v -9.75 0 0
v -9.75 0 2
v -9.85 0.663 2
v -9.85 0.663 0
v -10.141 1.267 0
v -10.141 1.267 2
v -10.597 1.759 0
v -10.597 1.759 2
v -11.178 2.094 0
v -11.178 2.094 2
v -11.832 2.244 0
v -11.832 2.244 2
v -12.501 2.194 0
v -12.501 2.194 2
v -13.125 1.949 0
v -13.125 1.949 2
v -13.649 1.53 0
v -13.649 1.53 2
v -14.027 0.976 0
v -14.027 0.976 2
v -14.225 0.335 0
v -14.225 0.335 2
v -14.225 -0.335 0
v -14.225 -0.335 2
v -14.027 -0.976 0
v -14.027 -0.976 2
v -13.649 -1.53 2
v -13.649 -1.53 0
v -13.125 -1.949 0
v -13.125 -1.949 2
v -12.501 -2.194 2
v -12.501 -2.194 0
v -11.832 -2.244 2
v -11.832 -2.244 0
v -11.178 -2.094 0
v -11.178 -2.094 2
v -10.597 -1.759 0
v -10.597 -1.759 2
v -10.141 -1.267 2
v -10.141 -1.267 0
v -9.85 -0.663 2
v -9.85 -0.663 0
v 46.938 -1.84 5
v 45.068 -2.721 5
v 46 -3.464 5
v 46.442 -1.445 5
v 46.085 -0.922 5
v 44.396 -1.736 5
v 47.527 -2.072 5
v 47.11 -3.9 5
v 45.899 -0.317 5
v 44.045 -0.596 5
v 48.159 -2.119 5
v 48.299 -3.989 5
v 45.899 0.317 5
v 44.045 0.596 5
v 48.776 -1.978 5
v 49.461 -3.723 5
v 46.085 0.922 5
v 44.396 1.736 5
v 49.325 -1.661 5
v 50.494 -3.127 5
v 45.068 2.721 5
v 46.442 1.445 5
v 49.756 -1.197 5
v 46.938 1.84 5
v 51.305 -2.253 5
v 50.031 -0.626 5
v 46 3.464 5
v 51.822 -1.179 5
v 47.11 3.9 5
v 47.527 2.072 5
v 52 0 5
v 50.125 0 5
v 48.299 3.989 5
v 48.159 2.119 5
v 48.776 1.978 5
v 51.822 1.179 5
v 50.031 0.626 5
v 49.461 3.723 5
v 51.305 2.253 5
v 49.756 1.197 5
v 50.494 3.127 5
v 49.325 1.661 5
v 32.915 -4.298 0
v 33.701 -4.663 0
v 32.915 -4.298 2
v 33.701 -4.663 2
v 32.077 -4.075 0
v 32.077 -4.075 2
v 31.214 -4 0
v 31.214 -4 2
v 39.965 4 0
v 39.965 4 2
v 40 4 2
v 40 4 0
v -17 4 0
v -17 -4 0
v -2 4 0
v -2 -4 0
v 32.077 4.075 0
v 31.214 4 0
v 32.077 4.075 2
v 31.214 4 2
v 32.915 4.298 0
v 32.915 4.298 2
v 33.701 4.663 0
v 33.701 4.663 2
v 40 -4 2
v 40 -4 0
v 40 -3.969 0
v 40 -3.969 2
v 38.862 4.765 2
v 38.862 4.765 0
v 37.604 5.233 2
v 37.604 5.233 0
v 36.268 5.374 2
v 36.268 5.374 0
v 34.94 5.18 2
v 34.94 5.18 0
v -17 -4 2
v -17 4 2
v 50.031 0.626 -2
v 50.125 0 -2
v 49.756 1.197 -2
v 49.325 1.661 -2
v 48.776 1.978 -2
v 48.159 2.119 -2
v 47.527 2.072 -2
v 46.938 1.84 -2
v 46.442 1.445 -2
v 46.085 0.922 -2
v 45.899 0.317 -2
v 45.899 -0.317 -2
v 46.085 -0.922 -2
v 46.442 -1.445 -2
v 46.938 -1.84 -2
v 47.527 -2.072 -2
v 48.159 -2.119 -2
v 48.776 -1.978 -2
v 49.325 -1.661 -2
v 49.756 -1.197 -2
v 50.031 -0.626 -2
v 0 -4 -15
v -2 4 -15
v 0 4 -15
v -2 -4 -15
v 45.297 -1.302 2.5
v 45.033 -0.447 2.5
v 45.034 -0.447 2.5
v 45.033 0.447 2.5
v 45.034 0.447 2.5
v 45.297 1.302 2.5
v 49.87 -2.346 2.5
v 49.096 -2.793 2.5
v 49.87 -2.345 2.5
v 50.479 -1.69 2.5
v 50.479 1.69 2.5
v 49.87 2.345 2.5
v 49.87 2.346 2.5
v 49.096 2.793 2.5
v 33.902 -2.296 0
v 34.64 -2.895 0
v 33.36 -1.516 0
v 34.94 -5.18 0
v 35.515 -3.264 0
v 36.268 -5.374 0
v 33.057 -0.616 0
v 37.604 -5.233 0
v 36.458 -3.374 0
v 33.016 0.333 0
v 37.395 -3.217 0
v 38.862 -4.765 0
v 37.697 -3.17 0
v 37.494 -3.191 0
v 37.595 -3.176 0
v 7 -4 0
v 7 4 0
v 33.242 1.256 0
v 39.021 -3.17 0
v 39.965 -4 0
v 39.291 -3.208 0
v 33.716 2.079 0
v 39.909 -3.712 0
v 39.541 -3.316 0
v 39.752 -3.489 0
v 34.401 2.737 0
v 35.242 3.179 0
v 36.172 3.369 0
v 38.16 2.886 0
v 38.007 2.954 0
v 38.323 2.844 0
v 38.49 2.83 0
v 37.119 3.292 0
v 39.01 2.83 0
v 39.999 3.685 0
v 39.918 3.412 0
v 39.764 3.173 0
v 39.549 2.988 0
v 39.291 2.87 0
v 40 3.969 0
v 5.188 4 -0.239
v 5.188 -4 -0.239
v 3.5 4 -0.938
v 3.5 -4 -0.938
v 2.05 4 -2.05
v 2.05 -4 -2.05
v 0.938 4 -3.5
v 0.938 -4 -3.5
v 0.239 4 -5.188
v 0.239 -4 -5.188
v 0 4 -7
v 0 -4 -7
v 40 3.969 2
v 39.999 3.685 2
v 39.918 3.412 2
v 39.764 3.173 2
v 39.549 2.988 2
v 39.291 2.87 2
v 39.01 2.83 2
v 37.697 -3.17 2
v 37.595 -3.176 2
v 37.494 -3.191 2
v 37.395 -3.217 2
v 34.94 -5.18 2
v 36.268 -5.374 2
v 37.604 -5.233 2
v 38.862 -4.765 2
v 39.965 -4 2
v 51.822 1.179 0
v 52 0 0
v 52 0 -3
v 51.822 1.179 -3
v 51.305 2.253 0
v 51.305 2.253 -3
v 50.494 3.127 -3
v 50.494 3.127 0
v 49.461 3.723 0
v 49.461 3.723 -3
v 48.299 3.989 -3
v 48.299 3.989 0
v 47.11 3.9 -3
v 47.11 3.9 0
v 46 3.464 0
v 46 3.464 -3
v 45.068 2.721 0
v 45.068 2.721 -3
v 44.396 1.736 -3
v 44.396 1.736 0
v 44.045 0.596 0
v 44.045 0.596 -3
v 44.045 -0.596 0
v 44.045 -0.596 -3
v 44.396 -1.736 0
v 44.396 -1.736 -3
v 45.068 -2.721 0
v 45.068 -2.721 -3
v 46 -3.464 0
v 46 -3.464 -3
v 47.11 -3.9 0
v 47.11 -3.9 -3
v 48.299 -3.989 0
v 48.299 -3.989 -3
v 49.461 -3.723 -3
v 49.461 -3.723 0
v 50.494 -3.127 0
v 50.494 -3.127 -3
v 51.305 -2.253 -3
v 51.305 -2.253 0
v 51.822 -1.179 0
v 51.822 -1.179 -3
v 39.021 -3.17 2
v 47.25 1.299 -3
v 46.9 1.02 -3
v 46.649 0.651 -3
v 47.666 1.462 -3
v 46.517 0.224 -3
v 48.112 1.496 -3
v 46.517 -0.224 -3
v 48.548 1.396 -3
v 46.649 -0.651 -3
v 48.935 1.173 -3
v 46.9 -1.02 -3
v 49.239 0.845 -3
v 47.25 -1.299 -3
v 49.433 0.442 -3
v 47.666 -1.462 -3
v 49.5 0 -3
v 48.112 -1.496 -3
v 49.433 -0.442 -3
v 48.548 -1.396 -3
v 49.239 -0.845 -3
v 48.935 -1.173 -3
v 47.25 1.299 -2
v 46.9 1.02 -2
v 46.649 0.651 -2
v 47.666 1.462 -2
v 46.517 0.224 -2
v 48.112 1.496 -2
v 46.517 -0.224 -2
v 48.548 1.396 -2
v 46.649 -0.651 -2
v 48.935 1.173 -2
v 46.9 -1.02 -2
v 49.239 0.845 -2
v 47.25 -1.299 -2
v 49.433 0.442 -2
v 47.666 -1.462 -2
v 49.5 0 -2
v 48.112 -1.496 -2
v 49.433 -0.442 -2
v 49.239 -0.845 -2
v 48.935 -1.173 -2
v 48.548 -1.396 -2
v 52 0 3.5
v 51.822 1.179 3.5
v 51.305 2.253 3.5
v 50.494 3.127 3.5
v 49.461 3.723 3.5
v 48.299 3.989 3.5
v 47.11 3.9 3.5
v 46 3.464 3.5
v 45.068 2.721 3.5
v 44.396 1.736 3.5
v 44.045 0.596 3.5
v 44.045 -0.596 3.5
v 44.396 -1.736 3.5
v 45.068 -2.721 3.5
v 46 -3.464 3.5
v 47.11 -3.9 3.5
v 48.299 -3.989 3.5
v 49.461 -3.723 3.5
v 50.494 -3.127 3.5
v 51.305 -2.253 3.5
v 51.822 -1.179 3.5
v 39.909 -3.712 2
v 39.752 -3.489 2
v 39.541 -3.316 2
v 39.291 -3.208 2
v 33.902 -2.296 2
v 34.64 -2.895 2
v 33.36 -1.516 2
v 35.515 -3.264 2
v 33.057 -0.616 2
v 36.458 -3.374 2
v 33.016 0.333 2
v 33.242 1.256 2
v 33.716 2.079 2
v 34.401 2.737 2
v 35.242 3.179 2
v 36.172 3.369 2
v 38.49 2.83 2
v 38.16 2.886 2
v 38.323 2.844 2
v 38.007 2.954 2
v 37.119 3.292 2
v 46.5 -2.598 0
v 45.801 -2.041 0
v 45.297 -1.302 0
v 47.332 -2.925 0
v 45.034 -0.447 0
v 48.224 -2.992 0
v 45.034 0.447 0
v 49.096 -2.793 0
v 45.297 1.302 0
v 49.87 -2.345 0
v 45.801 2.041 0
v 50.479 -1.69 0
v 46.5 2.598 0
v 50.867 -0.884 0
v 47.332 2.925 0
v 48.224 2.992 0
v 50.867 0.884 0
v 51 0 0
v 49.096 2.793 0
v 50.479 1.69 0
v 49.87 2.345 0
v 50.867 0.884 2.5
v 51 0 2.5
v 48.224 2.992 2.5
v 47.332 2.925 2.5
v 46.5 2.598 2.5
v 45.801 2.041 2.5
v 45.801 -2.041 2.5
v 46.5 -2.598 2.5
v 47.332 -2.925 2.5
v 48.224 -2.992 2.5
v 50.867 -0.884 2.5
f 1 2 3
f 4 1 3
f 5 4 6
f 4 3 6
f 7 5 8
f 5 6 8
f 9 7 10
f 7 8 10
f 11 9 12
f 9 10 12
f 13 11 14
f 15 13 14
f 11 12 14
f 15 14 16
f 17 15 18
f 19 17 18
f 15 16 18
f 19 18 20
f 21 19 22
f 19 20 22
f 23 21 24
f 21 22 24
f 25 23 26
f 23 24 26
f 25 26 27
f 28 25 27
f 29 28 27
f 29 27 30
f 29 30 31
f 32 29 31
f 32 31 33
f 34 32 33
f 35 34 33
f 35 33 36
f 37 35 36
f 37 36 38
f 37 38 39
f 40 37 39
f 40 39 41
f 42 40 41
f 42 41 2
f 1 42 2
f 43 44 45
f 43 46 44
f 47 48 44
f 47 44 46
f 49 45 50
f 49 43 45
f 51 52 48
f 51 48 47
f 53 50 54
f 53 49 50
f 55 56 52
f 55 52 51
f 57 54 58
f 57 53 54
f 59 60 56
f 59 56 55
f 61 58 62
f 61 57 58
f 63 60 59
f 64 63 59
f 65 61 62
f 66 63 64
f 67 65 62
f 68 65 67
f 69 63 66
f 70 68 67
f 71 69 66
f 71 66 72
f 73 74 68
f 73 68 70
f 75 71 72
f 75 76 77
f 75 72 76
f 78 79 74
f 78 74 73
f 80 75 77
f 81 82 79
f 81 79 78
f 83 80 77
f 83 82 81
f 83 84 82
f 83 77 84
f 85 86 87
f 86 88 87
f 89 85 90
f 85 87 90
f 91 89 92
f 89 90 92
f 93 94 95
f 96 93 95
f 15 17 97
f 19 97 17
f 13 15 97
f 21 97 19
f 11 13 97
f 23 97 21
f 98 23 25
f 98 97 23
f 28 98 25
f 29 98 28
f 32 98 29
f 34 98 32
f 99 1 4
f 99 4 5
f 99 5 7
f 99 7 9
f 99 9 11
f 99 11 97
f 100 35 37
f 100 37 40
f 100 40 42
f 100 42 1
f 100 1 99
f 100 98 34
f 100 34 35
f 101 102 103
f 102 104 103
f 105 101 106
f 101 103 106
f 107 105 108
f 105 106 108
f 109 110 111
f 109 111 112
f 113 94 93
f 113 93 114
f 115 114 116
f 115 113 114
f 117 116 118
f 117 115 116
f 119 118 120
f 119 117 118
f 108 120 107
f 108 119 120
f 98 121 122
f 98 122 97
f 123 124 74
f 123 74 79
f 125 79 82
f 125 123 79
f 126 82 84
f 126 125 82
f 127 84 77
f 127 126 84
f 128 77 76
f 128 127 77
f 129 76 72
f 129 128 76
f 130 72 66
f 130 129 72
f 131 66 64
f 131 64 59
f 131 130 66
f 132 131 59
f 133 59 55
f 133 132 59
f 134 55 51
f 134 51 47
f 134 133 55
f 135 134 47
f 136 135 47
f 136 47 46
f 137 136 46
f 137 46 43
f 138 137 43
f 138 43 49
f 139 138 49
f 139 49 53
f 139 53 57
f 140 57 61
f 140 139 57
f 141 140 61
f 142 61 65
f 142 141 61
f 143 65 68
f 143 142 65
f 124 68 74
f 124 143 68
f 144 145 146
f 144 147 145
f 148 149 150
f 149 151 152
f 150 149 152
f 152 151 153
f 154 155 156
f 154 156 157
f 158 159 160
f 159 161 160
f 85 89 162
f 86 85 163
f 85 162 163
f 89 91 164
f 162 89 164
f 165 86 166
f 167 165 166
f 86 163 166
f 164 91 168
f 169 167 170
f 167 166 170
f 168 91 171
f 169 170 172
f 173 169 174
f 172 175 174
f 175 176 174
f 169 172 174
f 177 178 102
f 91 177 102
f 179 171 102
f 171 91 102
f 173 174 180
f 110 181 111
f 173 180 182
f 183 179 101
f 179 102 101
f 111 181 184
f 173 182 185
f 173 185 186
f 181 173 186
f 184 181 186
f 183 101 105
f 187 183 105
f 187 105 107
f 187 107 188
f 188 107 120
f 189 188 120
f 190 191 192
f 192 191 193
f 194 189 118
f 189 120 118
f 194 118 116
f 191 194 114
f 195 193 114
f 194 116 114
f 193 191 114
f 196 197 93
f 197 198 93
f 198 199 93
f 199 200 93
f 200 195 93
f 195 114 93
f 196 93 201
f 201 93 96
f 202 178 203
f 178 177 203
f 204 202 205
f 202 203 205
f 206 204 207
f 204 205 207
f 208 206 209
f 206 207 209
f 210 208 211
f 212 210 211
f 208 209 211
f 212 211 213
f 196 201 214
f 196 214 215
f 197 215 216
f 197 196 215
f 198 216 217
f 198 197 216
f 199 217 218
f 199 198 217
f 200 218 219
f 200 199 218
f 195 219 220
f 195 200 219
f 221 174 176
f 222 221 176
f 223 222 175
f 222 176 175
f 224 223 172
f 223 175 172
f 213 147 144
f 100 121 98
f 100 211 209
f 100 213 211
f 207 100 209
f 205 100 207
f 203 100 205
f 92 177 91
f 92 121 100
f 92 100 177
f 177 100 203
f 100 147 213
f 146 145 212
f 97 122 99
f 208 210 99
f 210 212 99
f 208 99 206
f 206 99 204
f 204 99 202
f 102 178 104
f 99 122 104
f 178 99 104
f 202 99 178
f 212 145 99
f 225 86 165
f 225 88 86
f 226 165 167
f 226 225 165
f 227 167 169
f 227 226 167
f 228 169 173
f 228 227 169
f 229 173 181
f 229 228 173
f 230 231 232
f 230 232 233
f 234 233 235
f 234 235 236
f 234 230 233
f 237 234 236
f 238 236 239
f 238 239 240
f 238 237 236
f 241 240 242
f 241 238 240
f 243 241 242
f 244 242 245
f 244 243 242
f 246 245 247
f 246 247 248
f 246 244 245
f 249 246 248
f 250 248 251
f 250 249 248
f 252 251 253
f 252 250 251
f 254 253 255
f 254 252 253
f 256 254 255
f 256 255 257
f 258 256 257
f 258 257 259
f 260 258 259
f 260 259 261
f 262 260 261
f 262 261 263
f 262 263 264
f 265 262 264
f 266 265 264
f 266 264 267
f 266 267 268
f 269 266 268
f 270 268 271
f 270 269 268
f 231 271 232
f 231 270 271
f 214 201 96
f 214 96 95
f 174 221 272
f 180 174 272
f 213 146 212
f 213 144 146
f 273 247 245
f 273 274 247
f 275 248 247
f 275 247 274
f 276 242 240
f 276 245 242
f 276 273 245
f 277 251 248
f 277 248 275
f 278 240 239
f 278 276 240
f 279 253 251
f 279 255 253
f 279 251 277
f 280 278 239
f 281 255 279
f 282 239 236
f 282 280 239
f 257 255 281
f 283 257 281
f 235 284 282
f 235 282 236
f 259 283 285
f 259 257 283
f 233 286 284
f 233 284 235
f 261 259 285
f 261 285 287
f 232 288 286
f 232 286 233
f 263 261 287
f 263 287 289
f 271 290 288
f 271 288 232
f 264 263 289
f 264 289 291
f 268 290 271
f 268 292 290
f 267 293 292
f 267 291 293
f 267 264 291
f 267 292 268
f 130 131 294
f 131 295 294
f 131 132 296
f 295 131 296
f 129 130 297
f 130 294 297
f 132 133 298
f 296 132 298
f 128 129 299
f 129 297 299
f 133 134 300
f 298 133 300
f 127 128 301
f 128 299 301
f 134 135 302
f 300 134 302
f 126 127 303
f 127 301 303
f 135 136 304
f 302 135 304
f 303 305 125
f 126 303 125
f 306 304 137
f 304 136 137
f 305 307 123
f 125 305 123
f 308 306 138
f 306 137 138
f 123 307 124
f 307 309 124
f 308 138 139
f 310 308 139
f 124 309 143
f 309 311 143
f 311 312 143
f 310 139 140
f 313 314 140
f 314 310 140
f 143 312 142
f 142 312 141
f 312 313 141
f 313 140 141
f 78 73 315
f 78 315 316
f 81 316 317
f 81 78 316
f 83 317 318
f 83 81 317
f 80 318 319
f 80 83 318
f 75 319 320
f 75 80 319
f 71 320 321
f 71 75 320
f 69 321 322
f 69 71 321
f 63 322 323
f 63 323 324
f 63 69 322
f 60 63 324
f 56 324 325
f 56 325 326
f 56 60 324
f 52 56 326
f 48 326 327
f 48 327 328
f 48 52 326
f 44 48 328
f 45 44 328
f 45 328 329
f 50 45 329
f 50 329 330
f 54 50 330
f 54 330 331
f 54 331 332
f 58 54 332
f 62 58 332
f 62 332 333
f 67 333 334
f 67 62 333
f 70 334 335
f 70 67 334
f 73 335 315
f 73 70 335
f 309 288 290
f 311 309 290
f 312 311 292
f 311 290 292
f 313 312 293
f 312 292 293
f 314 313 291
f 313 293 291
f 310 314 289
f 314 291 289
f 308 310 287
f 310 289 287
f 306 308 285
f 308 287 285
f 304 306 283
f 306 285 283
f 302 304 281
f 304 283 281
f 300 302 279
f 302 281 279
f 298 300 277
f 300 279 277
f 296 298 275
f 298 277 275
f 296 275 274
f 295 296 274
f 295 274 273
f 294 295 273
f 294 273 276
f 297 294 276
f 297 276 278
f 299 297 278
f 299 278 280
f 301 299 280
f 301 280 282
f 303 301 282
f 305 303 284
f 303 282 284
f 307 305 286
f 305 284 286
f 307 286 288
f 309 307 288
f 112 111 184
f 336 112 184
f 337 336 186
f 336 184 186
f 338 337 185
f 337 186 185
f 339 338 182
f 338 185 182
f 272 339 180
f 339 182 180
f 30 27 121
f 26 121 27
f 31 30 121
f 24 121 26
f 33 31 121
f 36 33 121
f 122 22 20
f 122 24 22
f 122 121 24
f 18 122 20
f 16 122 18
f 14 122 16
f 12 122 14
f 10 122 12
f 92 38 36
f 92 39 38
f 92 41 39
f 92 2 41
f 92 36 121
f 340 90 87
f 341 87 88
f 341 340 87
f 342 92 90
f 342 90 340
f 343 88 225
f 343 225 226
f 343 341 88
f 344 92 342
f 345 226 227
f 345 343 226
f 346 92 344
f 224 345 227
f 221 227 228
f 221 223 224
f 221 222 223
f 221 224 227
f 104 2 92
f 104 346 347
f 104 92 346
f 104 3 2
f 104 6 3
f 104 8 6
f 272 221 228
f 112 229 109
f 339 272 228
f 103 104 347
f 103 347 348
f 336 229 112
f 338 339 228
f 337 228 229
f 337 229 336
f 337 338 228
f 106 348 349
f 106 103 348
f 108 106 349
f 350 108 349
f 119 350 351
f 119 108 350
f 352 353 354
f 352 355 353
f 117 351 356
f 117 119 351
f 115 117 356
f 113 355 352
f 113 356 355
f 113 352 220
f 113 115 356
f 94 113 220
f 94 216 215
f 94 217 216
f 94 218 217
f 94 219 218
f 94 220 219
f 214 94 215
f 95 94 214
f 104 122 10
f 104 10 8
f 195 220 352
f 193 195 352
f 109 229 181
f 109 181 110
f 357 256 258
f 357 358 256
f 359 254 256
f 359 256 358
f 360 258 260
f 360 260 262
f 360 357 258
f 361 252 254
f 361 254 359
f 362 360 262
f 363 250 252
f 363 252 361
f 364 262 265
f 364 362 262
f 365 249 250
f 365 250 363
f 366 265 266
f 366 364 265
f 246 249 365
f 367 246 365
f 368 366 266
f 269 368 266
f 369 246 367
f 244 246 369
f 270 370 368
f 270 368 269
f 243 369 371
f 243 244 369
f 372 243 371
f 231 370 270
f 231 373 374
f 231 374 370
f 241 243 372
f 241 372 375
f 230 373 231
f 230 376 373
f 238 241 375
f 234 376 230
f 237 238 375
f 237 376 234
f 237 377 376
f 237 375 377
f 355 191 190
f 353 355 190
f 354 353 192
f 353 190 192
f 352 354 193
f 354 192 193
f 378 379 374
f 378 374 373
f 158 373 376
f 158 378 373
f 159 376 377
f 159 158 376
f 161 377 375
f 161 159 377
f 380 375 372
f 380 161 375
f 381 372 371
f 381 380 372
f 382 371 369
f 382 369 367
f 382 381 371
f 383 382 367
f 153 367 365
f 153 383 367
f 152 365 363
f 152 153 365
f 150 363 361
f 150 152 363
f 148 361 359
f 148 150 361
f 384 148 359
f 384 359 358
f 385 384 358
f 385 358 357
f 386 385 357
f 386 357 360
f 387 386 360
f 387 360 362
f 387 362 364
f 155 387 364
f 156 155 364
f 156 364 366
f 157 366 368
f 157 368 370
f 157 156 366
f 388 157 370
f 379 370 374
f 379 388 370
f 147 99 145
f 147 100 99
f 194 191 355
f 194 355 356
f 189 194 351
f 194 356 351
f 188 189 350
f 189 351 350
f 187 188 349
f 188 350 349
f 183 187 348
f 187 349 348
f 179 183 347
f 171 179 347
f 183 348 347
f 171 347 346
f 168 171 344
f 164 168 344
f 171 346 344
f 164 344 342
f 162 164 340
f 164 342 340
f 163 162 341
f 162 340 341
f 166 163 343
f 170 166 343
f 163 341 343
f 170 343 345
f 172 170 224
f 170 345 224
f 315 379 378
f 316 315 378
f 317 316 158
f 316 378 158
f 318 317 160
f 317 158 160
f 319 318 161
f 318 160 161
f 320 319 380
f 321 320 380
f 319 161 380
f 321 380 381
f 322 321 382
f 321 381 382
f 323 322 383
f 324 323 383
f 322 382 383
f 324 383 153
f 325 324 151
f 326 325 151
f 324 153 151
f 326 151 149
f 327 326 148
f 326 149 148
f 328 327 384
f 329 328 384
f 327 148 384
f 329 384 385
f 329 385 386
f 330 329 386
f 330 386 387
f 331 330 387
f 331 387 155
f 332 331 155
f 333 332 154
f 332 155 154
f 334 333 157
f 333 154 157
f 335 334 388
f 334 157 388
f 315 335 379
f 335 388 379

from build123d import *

# Parameters (mm, degrees)
F1_DEPTH       = 4
F2_R           = 5.375
F3_DEPTH       = 2
F5_DEPTH       = 17.001
F6_R           = 7
F7_T1_DEPTH    = 3.3790215822
F7_T3_DEPTH    = 2.8251909372
F7_T5_DEPTH    = 10.474284143
F7_T7_DEPTH    = 11.6759161977
F8_R           = 2.25
F9_DEPTH       = 17.001
F10_R          = 3
F10_R_2        = 2.125
F11_DEPTH      = 5
F11_DEPTH_BACK = 3
F10_R_3        = 4
F12_DEPTH      = 3
F13_R          = 4
F13_R_2        = 3
F14_DEPTH      = 2.5
F15_R          = 2.125
F15_R_2        = 1.5
F16_DEPTH      = 1
F17_SIZE       = 0.99999
F18_R          = 5


# Not quite as in the source:
# - a fillet or chamfer that OpenCascade refuses, or shapes differently, is made with other operations: its cross-section is extruded or revolved along the edge and cut away or added
# - a fillet or chamfer is up to 0.001 mm smaller than in the source, because OpenCascade refuses the exact size


with BuildPart() as f1:
    # F0 (on Front) → F1 (new body, symmetric)
    with BuildSketch(Plane.XZ):
        Polygon((0, -15), (0, 0), (40, 0), (40, 2), (0, 2), (-17, 2), (-17, 0), (-2, 0), (-2, -15), align=None)
    extrude(amount=F1_DEPTH, both=True)

    # F2 (on face) → F3 (join, through all)
    with BuildSketch(Plane.XY.offset(2)):
        with Locations((36.375, 0)):
            Circle(F2_R)
    extrude(amount=-F3_DEPTH)

    # F4 (on face) → F5 (cut, through all)
    with BuildSketch(Plane.XY.offset(2)):
        with BuildLine():
            Line((40.9448929828, 2.8296118331), (38.214543931, 2.8296118331))
            ThreePointArc((38.214543931, 2.8296118331), (33.0216111212, 0.3813240457), (37.5322656873, -3.1703881669))
            Line((37.5322656873, -3.1703881669), (40.7154220844, -3.1703881669))
            ThreePointArc((40.7154220844, -3.1703881669), (41.7460733238, -0.2054175034), (40.9448929828, 2.8296118331))
        make_face()
    extrude(amount=-F5_DEPTH, mode=Mode.SUBTRACT)

    # F6
    f6_edges = [f1.edges().sort_by_distance(p)[0] for p in [
        (0, 0, 0),
    ]]
    fillet(f6_edges, radius=F6_R)

    # F7: fillet of radius 1 on 4 edges, made by hand

    # F7_s2 → F7_t1 (cut)
    with BuildSketch(Plane.XY.offset(-0.6895107911)):
        with BuildLine():
            ThreePointArc((38.0068400766, 2.9542719855), (38.2406883263, 2.8612782522), (38.4903482474, 2.8296118331))
            Line((38.4903482474, 2.8296118331), (38.214543931, 2.8296118331))
            ThreePointArc((38.214543931, 2.8296118331), (38.1118108044, 2.8938060111), (38.0068400766, 2.9542719855))
        make_face()
    extrude(amount=F7_T1_DEPTH, mode=Mode.SUBTRACT)

    # F7_s4 → F7_t3 (cut)
    with BuildSketch(Plane.XY.offset(-0.4125954686)):
        with BuildLine():
            ThreePointArc((37.6973038748, -3.1703881669), (37.544384911, -3.1821494354), (37.3950629891, -3.2171565859))
            ThreePointArc((37.3950629891, -3.2171565859), (37.4639154525, -3.1945090605), (37.5322656873, -3.1703881669))
            Line((37.5322656873, -3.1703881669), (37.6973038748, -3.1703881669))
        make_face()
    extrude(amount=F7_T3_DEPTH, mode=Mode.SUBTRACT)

    # F7_s6 → F7_t5 (cut)
    with BuildSketch(Plane.XY.offset(-4.2371420715)):
        with BuildLine():
            ThreePointArc((40, -3.9686269666), (39.6523242288, -3.3952232811), (39.0205652559, -3.1703881669))
            Line((39.0205652559, -3.1703881669), (40.7154220844, -3.1703881669))
            ThreePointArc((40.7154220844, -3.1703881669), (40.3776595585, -3.5873864385), (40, -3.9686269666))
        make_face()
    extrude(amount=F7_T5_DEPTH, mode=Mode.SUBTRACT)

    # F7_s8 → F7_t7 (cut)
    with BuildSketch(Plane.XY.offset(-4.8379580989)):
        with BuildLine():
            ThreePointArc((40, 3.9686269666), (39.7643669944, 3.1734926113), (39.0097097432, 2.8296118331))
            Line((39.0097097432, 2.8296118331), (40.9448929828, 2.8296118331))
            ThreePointArc((40.9448929828, 2.8296118331), (40.5118353386, 3.4317952127), (40, 3.9686269666))
        make_face()
    extrude(amount=F7_T7_DEPTH, mode=Mode.SUBTRACT)

    # F8 (on face) → F9 (cut, through all)
    with BuildSketch(Plane.XY.offset(2)):
        with Locations((-12, 0)):
            Circle(F8_R)
    extrude(amount=-F9_DEPTH, mode=Mode.SUBTRACT)

    # F18
    f18_edges = [f1.edges().sort_by_distance(p)[0] for p in [
        (32.784648, 4, 1),
        (32.784648, -4, 1),
    ]]
    fillet(f18_edges, radius=F18_R)


with BuildPart() as f11:
    # F10 (on Top) → F11 (new body, two sides)
    with BuildSketch(Plane.XY) as f11_sk:
        with Locations((48, 0)):
            Circle(F10_R)
        with Locations((48, 0)):
            Circle(F10_R_2, mode=Mode.SUBTRACT)
    extrude(amount=F11_DEPTH)
    extrude(f11_sk.sketch, amount=-F11_DEPTH_BACK)

    # F10 (on Top) → F12 (join, through all)
    with BuildSketch(Plane.XY):
        with Locations((48, 0)):
            Circle(F10_R_3)
        with Locations((48, 0)):
            Circle(F10_R, mode=Mode.SUBTRACT)
    extrude(amount=-F12_DEPTH)

    # F13 (on face) → F14 (join)
    with BuildSketch(Plane.XY.offset(5)):
        with Locations((48, 0)):
            Circle(F13_R)
        with Locations((48, 0)):
            Circle(F13_R_2, mode=Mode.SUBTRACT)
    extrude(amount=-F14_DEPTH)

    # F15 (on face) → F16 (join)
    with BuildSketch(Plane(origin=(0, 0, -3), x_dir=(1, 0, 0), z_dir=(0, 0, -1))):
        with Locations((48, 0)):
            Circle(F15_R)
        with Locations((48, 0)):
            Circle(F15_R_2, mode=Mode.SUBTRACT)
    extrude(amount=-F16_DEPTH)

    # F17 (size 1 in the source; OpenCascade refuses exactly that, so slightly less here)
    f17_edges = [f11.edges().sort_by_distance(p)[0] for p in [
        (44, 0, 2.5),
    ]]
    chamfer(f17_edges, length=F17_SIZE)


solid = Compound([f1.part, f11.part])
